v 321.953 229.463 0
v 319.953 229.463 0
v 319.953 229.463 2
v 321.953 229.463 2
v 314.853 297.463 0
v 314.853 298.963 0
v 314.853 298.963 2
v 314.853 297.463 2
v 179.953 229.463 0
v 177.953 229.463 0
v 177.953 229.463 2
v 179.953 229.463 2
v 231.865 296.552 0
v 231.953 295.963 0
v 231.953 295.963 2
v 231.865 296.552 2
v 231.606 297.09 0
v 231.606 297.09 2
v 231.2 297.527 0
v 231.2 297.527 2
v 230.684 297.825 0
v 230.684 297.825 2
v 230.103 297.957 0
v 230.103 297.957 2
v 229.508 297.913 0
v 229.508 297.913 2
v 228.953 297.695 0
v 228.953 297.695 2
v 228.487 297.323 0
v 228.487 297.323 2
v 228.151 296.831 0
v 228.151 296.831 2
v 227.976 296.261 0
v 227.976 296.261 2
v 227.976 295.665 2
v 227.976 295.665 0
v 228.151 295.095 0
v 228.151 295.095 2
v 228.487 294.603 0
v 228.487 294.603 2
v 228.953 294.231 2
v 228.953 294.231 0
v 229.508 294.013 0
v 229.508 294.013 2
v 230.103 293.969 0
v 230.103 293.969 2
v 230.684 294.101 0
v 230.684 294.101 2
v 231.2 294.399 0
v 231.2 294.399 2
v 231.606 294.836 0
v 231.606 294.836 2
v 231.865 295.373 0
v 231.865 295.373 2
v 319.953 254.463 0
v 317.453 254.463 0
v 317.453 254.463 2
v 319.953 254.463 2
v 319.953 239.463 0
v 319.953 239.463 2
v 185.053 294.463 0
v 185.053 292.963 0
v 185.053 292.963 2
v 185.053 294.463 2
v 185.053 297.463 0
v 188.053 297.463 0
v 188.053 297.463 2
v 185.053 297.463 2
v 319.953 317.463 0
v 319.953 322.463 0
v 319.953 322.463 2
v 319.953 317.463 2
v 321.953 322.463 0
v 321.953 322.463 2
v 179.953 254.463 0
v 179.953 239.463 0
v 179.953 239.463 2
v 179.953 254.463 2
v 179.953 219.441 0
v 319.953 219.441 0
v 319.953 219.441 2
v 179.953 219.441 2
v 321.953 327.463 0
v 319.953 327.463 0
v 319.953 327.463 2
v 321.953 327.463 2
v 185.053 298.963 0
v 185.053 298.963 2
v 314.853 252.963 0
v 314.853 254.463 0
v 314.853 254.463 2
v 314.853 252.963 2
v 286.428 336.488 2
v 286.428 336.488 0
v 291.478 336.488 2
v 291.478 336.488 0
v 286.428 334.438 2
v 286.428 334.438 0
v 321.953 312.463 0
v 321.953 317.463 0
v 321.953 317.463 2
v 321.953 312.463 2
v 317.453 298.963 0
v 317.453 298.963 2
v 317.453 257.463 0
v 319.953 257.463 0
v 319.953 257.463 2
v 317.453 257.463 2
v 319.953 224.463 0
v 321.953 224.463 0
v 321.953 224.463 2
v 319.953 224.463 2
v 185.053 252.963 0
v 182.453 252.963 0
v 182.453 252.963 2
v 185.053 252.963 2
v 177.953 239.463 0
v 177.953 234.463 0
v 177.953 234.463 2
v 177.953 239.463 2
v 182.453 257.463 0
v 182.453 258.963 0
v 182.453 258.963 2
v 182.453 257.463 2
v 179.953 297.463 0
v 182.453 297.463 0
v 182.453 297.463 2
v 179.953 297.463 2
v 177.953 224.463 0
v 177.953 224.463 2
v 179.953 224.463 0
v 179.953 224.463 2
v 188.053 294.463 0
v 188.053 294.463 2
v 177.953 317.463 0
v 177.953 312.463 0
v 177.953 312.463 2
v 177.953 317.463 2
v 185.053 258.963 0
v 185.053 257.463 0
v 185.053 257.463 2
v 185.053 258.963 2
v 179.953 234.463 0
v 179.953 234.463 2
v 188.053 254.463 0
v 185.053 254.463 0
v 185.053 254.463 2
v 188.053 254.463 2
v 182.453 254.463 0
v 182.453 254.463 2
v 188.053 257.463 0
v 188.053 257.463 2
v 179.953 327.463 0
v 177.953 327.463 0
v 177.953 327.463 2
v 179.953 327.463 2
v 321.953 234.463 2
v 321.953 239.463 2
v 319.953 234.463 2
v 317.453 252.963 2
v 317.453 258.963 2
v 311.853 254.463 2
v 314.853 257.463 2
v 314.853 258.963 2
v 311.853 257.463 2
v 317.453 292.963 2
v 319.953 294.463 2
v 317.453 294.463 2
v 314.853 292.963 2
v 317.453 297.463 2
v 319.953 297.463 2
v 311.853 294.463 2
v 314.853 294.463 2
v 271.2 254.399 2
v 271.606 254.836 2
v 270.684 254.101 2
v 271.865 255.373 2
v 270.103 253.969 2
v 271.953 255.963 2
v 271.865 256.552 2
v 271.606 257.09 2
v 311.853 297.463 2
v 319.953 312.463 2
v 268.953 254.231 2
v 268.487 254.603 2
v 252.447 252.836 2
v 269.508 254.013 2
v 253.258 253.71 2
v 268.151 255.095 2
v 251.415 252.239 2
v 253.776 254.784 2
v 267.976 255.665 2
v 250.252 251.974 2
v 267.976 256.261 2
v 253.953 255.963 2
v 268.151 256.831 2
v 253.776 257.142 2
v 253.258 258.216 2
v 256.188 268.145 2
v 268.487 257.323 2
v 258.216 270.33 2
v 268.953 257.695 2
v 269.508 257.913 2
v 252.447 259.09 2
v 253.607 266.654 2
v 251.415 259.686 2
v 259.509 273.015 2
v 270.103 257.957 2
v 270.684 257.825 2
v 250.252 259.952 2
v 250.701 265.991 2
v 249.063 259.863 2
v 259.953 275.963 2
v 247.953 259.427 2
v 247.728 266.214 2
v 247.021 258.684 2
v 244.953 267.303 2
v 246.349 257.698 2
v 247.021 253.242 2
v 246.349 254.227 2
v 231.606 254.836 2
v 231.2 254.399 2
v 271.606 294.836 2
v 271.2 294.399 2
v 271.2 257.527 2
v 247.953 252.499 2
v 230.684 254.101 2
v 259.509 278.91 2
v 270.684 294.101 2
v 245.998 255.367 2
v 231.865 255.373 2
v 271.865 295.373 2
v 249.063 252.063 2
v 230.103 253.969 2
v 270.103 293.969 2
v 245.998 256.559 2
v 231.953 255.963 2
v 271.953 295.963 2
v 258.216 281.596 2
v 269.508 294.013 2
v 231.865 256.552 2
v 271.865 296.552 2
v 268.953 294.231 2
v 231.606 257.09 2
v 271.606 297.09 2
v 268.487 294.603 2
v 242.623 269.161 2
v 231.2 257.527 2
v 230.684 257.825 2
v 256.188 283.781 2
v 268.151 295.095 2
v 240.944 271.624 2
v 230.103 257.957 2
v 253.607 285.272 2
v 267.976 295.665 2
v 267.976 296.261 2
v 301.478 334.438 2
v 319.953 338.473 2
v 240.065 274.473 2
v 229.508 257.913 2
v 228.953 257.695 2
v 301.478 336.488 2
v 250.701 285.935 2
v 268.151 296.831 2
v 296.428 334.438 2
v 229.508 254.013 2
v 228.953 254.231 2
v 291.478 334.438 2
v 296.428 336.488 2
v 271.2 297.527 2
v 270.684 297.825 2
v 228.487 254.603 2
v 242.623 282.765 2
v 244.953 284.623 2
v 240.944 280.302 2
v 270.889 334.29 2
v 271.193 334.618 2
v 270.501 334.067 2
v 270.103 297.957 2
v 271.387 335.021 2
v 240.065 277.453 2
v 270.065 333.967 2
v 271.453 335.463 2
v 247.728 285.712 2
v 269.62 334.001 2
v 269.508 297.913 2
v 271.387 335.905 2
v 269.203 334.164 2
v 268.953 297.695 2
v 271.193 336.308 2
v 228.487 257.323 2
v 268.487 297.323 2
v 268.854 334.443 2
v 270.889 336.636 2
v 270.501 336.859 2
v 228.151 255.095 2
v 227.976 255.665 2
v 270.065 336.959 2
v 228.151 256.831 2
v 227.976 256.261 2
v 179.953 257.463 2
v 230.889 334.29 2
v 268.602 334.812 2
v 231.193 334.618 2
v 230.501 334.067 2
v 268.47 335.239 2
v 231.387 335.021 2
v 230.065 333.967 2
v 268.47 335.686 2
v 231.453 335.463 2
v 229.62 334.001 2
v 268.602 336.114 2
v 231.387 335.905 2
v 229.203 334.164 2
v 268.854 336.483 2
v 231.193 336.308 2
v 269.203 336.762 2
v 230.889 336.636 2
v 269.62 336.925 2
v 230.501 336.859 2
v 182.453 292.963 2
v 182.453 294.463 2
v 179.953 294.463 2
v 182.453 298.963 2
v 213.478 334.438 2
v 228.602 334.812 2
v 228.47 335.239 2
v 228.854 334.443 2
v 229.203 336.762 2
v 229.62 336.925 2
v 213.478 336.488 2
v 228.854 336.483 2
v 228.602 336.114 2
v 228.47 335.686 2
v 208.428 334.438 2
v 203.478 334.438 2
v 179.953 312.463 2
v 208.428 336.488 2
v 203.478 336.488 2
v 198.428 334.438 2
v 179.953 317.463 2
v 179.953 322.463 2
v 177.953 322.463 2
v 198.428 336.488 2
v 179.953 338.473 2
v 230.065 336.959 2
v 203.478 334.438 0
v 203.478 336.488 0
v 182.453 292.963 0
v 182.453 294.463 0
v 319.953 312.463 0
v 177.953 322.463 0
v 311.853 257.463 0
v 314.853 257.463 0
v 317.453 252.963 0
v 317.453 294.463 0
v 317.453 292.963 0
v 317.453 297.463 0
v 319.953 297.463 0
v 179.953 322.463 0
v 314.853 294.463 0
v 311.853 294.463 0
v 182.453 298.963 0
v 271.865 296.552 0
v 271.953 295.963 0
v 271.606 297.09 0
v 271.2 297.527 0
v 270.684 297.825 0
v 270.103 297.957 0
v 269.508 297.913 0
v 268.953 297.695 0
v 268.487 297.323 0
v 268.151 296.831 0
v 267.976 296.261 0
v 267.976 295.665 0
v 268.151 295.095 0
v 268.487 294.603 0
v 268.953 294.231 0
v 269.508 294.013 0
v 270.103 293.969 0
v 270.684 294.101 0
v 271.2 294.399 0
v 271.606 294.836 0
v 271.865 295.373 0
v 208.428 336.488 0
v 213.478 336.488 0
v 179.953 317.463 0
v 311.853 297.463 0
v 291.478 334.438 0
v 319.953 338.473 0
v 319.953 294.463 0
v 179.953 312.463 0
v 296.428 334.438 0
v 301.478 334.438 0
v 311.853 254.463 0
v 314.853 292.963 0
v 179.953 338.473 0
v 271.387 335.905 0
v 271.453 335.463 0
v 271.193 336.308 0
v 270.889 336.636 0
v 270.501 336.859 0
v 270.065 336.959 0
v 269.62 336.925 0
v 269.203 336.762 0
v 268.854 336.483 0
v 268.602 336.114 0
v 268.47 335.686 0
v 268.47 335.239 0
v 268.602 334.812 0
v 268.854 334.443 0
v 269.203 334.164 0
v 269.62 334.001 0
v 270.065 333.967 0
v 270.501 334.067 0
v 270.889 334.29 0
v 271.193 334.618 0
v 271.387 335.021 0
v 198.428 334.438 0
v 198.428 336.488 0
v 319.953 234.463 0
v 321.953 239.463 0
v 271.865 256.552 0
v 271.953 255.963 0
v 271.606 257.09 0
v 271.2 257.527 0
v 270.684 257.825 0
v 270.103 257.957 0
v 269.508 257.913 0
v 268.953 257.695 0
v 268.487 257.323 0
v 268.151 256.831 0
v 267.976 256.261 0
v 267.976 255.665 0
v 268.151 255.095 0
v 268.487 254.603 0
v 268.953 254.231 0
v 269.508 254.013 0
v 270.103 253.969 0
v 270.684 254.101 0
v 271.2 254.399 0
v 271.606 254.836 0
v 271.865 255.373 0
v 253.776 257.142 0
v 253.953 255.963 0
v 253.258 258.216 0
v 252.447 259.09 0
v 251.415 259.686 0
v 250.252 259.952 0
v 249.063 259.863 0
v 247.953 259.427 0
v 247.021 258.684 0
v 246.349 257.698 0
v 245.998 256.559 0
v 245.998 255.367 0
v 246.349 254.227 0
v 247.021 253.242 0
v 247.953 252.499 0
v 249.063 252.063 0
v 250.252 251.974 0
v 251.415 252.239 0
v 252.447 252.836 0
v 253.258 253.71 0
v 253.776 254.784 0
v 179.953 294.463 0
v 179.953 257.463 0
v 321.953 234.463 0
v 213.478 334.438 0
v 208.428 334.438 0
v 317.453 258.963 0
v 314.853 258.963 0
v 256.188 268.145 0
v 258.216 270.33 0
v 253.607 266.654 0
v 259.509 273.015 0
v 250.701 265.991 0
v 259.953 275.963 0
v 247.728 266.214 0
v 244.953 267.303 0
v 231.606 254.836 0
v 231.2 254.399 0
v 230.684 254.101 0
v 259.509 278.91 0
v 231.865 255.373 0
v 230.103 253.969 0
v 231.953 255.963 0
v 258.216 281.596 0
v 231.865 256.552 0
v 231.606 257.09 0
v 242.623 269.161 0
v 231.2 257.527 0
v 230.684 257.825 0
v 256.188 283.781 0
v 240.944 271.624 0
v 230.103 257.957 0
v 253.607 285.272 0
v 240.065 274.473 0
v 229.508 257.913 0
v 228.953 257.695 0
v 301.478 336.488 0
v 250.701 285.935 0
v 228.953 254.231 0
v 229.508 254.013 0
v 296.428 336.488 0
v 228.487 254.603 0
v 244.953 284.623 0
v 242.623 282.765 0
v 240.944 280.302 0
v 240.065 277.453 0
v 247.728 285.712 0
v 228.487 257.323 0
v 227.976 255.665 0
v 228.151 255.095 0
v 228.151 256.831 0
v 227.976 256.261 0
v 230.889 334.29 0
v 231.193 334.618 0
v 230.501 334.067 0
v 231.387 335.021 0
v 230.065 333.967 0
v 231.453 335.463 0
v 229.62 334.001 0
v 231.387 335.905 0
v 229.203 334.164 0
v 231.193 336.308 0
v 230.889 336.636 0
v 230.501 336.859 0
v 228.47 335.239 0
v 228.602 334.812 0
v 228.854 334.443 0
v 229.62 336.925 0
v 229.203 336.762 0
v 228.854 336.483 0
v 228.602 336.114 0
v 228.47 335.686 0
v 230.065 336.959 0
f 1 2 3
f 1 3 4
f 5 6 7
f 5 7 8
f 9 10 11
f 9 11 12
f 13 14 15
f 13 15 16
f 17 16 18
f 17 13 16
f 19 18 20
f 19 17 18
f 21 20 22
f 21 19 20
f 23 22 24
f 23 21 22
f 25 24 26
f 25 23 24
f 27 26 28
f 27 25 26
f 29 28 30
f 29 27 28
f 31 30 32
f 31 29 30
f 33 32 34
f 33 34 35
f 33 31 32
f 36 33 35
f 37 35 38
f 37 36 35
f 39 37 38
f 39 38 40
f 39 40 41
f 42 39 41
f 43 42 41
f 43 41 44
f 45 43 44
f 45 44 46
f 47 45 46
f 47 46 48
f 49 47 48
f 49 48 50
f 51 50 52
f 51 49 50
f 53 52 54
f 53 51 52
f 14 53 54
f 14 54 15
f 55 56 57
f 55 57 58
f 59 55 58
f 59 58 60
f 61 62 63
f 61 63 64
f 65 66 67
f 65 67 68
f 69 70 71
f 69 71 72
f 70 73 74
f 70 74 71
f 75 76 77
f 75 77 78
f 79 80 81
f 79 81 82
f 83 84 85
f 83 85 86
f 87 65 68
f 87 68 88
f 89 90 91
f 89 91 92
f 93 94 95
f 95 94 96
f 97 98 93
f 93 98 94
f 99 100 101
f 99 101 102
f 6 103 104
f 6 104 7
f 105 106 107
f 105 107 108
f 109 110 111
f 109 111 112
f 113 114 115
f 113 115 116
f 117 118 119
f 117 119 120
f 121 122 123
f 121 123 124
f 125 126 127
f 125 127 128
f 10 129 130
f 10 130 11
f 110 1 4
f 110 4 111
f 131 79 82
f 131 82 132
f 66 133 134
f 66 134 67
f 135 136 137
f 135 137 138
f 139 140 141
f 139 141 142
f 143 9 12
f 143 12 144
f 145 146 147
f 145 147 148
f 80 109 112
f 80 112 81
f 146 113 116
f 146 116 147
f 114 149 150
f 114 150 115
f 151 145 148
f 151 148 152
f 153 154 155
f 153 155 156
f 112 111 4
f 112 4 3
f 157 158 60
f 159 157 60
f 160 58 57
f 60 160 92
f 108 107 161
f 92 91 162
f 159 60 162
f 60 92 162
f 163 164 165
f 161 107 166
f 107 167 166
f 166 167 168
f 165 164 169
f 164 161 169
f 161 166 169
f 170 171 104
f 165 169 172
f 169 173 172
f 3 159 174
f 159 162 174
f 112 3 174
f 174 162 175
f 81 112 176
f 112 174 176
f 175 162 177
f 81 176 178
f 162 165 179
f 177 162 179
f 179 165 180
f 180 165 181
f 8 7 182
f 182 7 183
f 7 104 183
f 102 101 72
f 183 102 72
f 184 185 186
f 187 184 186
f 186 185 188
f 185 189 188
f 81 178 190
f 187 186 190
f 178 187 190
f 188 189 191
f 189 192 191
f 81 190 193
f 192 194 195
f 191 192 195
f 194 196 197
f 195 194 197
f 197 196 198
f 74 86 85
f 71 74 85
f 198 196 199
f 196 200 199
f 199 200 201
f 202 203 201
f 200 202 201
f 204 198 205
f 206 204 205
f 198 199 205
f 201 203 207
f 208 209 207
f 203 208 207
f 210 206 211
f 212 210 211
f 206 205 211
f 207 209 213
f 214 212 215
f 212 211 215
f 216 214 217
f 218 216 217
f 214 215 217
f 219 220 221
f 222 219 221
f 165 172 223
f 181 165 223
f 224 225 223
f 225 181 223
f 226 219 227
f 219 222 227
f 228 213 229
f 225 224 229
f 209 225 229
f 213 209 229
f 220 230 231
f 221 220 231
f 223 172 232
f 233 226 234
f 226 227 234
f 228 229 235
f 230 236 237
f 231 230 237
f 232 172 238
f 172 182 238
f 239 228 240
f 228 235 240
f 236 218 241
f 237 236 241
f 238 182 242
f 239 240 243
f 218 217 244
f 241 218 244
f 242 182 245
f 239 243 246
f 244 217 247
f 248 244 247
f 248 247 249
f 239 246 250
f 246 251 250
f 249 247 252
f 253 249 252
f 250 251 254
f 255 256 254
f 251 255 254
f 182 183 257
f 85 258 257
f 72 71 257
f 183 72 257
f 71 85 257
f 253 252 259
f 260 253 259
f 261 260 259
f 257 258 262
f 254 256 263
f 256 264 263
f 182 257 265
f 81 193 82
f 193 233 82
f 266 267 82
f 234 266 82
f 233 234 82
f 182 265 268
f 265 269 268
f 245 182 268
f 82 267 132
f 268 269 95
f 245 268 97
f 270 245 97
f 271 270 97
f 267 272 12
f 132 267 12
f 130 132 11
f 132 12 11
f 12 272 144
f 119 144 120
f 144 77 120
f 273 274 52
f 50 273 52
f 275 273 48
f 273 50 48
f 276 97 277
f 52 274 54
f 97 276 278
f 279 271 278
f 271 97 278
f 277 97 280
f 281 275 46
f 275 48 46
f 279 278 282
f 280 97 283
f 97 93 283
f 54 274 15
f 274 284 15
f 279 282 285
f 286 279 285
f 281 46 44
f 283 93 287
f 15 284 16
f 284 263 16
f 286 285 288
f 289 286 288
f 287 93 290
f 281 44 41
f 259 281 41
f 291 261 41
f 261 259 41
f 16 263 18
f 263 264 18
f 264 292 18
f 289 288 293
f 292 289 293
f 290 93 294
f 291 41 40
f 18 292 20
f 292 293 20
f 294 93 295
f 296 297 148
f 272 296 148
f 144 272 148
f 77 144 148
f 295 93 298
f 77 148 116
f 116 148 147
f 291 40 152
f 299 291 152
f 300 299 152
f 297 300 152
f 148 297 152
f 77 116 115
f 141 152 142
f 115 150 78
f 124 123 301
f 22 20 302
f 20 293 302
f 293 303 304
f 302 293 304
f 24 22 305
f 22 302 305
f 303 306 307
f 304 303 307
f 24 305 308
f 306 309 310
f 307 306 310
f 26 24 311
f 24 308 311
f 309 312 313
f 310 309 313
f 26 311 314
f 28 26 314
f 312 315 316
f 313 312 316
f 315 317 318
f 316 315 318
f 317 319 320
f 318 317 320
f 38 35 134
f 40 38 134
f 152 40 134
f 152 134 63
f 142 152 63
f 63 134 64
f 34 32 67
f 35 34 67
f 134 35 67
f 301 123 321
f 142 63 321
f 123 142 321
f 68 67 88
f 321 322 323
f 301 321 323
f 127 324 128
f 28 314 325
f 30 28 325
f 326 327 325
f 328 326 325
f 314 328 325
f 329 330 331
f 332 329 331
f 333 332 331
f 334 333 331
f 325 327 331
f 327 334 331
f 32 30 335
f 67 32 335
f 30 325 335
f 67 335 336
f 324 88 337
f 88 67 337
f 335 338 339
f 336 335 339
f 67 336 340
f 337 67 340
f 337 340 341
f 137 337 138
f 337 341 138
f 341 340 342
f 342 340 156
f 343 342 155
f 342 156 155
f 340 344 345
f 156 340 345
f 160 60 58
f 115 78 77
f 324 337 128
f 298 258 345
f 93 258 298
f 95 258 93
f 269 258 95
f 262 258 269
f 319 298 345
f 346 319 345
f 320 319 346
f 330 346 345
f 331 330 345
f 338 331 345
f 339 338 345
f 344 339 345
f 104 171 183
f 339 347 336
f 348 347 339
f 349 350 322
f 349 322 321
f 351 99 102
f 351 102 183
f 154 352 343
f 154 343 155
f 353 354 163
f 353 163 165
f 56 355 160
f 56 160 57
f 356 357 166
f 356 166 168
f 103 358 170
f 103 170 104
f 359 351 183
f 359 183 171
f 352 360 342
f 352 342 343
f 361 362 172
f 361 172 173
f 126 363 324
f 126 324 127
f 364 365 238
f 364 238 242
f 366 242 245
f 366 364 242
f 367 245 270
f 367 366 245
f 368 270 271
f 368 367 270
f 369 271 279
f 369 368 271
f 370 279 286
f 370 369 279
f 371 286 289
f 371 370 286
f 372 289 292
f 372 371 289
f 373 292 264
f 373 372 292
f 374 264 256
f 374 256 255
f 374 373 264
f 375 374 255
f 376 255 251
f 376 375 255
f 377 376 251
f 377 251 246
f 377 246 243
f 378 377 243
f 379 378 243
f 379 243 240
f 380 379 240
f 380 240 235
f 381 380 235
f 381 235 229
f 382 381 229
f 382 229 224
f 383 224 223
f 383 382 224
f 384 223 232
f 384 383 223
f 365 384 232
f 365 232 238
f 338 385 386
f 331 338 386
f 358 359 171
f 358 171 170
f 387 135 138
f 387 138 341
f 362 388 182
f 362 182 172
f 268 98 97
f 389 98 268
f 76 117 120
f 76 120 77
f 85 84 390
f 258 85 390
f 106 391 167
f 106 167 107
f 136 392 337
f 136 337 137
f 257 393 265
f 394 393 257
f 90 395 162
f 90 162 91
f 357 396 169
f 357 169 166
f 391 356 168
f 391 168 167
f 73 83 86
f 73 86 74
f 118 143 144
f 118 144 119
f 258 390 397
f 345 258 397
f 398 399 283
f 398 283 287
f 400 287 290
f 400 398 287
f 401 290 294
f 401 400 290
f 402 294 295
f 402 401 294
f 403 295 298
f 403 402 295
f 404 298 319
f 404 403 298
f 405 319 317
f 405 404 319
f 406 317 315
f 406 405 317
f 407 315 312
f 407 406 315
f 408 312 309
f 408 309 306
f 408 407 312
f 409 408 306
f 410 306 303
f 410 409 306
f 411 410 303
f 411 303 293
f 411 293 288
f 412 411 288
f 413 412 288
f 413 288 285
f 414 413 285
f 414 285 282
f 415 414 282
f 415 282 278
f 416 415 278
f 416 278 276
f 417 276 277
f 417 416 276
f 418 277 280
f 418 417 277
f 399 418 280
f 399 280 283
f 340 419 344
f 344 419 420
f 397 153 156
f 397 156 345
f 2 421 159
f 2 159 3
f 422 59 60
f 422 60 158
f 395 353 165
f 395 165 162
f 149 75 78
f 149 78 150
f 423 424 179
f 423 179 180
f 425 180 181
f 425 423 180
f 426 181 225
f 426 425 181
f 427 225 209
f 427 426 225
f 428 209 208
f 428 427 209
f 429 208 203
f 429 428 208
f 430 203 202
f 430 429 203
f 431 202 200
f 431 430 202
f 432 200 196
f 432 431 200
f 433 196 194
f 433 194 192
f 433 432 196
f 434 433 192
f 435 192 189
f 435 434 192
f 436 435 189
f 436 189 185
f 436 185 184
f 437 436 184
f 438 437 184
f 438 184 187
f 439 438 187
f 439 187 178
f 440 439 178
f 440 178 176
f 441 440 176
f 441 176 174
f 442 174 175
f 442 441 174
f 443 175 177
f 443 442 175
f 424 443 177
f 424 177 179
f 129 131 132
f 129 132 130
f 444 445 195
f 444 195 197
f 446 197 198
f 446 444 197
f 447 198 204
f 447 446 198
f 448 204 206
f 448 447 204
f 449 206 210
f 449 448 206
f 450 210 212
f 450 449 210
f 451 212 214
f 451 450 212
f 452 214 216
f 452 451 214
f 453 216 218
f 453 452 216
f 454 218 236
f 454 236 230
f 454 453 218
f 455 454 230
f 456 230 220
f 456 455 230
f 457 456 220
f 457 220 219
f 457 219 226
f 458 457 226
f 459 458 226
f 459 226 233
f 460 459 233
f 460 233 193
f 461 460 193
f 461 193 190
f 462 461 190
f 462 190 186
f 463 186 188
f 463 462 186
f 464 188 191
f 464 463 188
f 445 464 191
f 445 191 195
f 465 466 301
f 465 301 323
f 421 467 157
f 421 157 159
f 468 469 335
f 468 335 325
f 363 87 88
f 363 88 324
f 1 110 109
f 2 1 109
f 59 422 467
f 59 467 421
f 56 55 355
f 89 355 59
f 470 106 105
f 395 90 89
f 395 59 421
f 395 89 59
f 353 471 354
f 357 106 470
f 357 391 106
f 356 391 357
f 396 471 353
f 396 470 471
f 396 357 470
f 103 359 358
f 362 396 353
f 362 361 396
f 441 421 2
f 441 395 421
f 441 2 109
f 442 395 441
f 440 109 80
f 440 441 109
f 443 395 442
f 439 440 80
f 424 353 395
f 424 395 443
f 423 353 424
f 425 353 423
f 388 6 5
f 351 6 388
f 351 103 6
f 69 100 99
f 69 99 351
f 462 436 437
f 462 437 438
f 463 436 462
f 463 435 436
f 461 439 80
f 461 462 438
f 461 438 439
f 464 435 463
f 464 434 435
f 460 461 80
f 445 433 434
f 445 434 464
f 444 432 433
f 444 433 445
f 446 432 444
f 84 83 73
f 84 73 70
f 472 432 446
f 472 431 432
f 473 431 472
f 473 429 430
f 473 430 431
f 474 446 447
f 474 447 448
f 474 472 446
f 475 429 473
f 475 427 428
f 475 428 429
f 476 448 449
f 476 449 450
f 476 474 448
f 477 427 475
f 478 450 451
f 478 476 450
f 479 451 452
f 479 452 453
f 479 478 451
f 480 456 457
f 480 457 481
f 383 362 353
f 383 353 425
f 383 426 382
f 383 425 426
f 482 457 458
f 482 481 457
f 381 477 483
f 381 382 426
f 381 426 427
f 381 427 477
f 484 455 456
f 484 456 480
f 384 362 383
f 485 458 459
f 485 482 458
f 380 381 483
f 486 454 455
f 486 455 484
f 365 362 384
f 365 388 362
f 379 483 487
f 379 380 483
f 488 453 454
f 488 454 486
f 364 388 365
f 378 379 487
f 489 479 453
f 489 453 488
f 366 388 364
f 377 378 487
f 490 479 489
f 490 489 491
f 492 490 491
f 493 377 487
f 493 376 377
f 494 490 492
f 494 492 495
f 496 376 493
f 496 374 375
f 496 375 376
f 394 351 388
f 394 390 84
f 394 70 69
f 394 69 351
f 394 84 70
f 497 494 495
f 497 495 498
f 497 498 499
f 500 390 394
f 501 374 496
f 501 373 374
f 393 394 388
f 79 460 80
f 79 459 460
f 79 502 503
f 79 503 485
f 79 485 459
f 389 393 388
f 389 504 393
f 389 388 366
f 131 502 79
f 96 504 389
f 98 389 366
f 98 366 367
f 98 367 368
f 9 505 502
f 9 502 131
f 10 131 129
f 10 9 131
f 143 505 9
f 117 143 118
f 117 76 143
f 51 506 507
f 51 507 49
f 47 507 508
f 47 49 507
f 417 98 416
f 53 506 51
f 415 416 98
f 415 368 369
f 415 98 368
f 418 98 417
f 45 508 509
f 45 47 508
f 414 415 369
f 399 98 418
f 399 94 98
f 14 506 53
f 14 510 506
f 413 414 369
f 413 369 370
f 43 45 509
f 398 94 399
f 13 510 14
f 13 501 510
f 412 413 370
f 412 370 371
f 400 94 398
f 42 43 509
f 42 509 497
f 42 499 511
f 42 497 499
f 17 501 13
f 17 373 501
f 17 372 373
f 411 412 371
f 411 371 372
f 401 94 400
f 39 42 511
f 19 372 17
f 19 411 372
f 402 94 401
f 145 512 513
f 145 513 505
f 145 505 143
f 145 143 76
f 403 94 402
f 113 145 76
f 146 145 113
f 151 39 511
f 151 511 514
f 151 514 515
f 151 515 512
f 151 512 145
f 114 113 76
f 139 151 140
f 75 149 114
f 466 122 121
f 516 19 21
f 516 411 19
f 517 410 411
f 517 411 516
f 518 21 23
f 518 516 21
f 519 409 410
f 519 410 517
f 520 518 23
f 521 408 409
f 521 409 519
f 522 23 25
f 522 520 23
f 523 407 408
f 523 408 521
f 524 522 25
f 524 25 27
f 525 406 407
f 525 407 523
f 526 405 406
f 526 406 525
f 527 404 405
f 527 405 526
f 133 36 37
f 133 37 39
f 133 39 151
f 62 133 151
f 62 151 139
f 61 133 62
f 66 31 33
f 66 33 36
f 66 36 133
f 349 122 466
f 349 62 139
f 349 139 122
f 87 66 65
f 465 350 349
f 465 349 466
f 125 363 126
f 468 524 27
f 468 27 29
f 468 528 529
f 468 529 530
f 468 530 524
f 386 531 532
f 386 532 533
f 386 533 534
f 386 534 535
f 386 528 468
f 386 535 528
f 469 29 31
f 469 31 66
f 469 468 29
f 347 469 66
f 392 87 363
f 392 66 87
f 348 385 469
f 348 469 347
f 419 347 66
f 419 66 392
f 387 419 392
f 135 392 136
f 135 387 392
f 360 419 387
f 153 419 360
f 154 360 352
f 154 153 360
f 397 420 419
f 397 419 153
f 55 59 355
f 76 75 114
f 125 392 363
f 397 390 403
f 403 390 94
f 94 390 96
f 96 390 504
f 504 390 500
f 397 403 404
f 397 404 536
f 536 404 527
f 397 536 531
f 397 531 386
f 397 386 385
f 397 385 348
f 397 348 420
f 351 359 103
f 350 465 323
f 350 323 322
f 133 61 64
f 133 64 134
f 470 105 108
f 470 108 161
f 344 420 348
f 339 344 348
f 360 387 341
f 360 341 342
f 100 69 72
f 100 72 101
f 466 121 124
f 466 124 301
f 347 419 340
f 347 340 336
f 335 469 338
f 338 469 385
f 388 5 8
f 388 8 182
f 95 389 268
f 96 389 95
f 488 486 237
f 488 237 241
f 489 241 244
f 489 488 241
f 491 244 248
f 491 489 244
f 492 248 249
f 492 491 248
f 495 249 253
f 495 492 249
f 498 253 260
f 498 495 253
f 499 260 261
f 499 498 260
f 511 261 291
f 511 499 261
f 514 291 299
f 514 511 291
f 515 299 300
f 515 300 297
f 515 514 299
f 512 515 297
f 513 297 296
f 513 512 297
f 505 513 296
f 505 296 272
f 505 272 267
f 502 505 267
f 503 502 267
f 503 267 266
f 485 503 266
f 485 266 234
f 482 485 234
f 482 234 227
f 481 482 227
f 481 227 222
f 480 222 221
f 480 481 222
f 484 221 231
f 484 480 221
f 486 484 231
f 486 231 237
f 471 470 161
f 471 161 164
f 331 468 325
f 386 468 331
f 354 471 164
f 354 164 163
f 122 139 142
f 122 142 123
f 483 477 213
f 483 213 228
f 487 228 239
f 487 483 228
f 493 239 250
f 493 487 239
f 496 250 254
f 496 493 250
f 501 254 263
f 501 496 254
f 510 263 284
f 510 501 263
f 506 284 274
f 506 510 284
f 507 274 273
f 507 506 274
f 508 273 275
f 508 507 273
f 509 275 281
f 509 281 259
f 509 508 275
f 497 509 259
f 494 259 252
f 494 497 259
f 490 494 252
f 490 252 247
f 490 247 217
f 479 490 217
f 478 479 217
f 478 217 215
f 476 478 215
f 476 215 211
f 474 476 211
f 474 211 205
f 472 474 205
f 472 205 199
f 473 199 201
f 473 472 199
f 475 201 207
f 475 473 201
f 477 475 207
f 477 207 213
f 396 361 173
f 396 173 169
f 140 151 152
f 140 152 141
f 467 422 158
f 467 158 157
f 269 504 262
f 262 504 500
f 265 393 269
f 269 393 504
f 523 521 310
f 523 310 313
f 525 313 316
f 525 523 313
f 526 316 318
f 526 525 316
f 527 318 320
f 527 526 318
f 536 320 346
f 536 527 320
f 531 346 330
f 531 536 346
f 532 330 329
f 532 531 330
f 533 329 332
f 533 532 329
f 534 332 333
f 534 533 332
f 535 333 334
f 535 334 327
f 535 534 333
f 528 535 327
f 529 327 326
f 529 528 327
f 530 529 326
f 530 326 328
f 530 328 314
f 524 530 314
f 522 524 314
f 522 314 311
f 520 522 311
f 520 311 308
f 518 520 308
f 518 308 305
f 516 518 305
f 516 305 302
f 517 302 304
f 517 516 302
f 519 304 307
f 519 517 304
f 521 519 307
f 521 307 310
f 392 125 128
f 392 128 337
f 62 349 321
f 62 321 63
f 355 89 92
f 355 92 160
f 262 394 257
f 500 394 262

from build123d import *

# Parameters (mm, degrees)
SKETCH_1_R      = 10
SKETCH_1_R_2    = 4
SKETCH_1_R_3    = 1.5
SKETCH_1_R_4    = 2
SKETCH_1_W      = 5.05
SKETCH_1_H      = 2.05
EXTRUDE_1_DEPTH = 2


with BuildPart() as part:
    # 草图1 → 凸台-拉伸1 (new body)
    with BuildSketch(Plane.XY):
        Polygon((317.453360513, 257.462931603), (317.453360513, 258.962931602), (314.853360513, 258.962931602), (314.853360513, 257.462931603), (311.853360513, 257.462931603), (311.853360513, 254.462931603), (314.853360513, 254.462931603), (314.853360513, 252.962931603), (317.453360513, 252.962931603), (317.453360513, 254.462931603), (319.953360513, 254.462931603), (319.953360513, 239.462931603), (321.953360513, 239.462931603), (321.953360513, 234.462931603), (319.953360513, 234.462931603), (319.953360513, 229.462931603), (321.953360513, 229.462931603), (321.953360513, 224.462931603), (319.953360513, 224.462931603), (319.953360513, 219.440879401), (179.953360513, 219.440879401), (179.953360513, 224.462931603), (177.953360513, 224.462931603), (177.953360513, 229.462931603), (179.953360513, 229.462931603), (179.953360513, 234.462931603), (177.953360513, 234.462931603), (177.953360513, 239.462931603), (179.953360513, 239.462931603), (179.953360513, 254.462931603), (182.453360513, 254.462931603), (182.453360513, 252.962931603), (185.053360513, 252.962931603), (185.053360513, 254.462931603), (188.053360513, 254.462931603), (188.053360513, 257.462931603), (185.053360513, 257.462931603), (185.053360513, 258.962931602), (182.453360513, 258.962931602), (182.453360513, 257.462931603), (179.953360513, 257.462931603), (179.953360513, 294.462931603), (182.453360513, 294.462931603), (182.453360513, 292.962931603), (185.053360513, 292.962931603), (185.053360513, 294.462931603), (188.053360513, 294.462931603), (188.053360513, 297.462931603), (185.053360513, 297.462931603), (185.053360513, 298.962931603), (182.453360513, 298.962931603), (182.453360513, 297.462931603), (179.953360513, 297.462931603), (179.953360513, 312.462931603), (177.953360513, 312.462931603), (177.953360513, 317.462931603), (179.953360513, 317.462931603), (179.953360513, 322.462931603), (177.953360513, 322.462931603), (177.953360513, 327.462931603), (179.953360513, 327.462931603), (179.953360513, 338.472931603), (317.453360513, 338.472931603), (319.953360513, 338.472931603), (319.953360513, 330.982931603), (319.953360513, 327.462931603), (321.953360513, 327.462931603), (321.953360513, 322.462931603), (319.953360513, 322.462931603), (319.953360513, 317.462931603), (321.953360513, 317.462931603), (321.953360513, 312.462931603), (319.953360513, 312.462931603), (319.953360513, 297.462931603), (317.453360513, 297.462931603), (317.453360513, 298.962931603), (314.853360513, 298.962931603), (314.853360513, 297.462931603), (311.853360513, 297.462931603), (311.853360513, 294.462931603), (314.853360513, 294.462931603), (314.853360513, 292.962931603), (317.453360513, 292.962931603), (317.453360513, 294.462931603), (319.953360513, 294.462931603), (319.953360513, 257.462931603), align=None)
        with Locations((249.953360513, 275.962931603)):
            Circle(SKETCH_1_R, mode=Mode.SUBTRACT)
        with Locations((249.953360513, 255.962931603)):
            Circle(SKETCH_1_R_2, mode=Mode.SUBTRACT)
        with Locations((229.953360513, 335.462931603)):
            Circle(SKETCH_1_R_3, mode=Mode.SUBTRACT)
        with Locations((269.953360513, 335.462931603)):
            Circle(SKETCH_1_R_3, mode=Mode.SUBTRACT)
        with Locations((229.953360513, 255.962931603)):
            Circle(SKETCH_1_R_4, mode=Mode.SUBTRACT)
        with Locations((229.953360513, 295.962931603)):
            Circle(SKETCH_1_R_4, mode=Mode.SUBTRACT)
        with Locations((269.953360513, 295.962931603)):
            Circle(SKETCH_1_R_4, mode=Mode.SUBTRACT)
        with Locations((269.953360513, 255.962931603)):
            Circle(SKETCH_1_R_4, mode=Mode.SUBTRACT)
        with Locations((288.953360513, 335.462931603)):
            Rectangle(SKETCH_1_W, SKETCH_1_H, mode=Mode.SUBTRACT)
        with Locations((298.953360513, 335.462931603)):
            Rectangle(SKETCH_1_W, SKETCH_1_H, mode=Mode.SUBTRACT)
        with Locations((200.953360513, 335.462931603)):
            Rectangle(SKETCH_1_W, SKETCH_1_H, mode=Mode.SUBTRACT)
        with Locations((210.953360513, 335.462931603)):
            Rectangle(SKETCH_1_W, SKETCH_1_H, mode=Mode.SUBTRACT)
    extrude(amount=EXTRUDE_1_DEPTH)


solid = part.part
